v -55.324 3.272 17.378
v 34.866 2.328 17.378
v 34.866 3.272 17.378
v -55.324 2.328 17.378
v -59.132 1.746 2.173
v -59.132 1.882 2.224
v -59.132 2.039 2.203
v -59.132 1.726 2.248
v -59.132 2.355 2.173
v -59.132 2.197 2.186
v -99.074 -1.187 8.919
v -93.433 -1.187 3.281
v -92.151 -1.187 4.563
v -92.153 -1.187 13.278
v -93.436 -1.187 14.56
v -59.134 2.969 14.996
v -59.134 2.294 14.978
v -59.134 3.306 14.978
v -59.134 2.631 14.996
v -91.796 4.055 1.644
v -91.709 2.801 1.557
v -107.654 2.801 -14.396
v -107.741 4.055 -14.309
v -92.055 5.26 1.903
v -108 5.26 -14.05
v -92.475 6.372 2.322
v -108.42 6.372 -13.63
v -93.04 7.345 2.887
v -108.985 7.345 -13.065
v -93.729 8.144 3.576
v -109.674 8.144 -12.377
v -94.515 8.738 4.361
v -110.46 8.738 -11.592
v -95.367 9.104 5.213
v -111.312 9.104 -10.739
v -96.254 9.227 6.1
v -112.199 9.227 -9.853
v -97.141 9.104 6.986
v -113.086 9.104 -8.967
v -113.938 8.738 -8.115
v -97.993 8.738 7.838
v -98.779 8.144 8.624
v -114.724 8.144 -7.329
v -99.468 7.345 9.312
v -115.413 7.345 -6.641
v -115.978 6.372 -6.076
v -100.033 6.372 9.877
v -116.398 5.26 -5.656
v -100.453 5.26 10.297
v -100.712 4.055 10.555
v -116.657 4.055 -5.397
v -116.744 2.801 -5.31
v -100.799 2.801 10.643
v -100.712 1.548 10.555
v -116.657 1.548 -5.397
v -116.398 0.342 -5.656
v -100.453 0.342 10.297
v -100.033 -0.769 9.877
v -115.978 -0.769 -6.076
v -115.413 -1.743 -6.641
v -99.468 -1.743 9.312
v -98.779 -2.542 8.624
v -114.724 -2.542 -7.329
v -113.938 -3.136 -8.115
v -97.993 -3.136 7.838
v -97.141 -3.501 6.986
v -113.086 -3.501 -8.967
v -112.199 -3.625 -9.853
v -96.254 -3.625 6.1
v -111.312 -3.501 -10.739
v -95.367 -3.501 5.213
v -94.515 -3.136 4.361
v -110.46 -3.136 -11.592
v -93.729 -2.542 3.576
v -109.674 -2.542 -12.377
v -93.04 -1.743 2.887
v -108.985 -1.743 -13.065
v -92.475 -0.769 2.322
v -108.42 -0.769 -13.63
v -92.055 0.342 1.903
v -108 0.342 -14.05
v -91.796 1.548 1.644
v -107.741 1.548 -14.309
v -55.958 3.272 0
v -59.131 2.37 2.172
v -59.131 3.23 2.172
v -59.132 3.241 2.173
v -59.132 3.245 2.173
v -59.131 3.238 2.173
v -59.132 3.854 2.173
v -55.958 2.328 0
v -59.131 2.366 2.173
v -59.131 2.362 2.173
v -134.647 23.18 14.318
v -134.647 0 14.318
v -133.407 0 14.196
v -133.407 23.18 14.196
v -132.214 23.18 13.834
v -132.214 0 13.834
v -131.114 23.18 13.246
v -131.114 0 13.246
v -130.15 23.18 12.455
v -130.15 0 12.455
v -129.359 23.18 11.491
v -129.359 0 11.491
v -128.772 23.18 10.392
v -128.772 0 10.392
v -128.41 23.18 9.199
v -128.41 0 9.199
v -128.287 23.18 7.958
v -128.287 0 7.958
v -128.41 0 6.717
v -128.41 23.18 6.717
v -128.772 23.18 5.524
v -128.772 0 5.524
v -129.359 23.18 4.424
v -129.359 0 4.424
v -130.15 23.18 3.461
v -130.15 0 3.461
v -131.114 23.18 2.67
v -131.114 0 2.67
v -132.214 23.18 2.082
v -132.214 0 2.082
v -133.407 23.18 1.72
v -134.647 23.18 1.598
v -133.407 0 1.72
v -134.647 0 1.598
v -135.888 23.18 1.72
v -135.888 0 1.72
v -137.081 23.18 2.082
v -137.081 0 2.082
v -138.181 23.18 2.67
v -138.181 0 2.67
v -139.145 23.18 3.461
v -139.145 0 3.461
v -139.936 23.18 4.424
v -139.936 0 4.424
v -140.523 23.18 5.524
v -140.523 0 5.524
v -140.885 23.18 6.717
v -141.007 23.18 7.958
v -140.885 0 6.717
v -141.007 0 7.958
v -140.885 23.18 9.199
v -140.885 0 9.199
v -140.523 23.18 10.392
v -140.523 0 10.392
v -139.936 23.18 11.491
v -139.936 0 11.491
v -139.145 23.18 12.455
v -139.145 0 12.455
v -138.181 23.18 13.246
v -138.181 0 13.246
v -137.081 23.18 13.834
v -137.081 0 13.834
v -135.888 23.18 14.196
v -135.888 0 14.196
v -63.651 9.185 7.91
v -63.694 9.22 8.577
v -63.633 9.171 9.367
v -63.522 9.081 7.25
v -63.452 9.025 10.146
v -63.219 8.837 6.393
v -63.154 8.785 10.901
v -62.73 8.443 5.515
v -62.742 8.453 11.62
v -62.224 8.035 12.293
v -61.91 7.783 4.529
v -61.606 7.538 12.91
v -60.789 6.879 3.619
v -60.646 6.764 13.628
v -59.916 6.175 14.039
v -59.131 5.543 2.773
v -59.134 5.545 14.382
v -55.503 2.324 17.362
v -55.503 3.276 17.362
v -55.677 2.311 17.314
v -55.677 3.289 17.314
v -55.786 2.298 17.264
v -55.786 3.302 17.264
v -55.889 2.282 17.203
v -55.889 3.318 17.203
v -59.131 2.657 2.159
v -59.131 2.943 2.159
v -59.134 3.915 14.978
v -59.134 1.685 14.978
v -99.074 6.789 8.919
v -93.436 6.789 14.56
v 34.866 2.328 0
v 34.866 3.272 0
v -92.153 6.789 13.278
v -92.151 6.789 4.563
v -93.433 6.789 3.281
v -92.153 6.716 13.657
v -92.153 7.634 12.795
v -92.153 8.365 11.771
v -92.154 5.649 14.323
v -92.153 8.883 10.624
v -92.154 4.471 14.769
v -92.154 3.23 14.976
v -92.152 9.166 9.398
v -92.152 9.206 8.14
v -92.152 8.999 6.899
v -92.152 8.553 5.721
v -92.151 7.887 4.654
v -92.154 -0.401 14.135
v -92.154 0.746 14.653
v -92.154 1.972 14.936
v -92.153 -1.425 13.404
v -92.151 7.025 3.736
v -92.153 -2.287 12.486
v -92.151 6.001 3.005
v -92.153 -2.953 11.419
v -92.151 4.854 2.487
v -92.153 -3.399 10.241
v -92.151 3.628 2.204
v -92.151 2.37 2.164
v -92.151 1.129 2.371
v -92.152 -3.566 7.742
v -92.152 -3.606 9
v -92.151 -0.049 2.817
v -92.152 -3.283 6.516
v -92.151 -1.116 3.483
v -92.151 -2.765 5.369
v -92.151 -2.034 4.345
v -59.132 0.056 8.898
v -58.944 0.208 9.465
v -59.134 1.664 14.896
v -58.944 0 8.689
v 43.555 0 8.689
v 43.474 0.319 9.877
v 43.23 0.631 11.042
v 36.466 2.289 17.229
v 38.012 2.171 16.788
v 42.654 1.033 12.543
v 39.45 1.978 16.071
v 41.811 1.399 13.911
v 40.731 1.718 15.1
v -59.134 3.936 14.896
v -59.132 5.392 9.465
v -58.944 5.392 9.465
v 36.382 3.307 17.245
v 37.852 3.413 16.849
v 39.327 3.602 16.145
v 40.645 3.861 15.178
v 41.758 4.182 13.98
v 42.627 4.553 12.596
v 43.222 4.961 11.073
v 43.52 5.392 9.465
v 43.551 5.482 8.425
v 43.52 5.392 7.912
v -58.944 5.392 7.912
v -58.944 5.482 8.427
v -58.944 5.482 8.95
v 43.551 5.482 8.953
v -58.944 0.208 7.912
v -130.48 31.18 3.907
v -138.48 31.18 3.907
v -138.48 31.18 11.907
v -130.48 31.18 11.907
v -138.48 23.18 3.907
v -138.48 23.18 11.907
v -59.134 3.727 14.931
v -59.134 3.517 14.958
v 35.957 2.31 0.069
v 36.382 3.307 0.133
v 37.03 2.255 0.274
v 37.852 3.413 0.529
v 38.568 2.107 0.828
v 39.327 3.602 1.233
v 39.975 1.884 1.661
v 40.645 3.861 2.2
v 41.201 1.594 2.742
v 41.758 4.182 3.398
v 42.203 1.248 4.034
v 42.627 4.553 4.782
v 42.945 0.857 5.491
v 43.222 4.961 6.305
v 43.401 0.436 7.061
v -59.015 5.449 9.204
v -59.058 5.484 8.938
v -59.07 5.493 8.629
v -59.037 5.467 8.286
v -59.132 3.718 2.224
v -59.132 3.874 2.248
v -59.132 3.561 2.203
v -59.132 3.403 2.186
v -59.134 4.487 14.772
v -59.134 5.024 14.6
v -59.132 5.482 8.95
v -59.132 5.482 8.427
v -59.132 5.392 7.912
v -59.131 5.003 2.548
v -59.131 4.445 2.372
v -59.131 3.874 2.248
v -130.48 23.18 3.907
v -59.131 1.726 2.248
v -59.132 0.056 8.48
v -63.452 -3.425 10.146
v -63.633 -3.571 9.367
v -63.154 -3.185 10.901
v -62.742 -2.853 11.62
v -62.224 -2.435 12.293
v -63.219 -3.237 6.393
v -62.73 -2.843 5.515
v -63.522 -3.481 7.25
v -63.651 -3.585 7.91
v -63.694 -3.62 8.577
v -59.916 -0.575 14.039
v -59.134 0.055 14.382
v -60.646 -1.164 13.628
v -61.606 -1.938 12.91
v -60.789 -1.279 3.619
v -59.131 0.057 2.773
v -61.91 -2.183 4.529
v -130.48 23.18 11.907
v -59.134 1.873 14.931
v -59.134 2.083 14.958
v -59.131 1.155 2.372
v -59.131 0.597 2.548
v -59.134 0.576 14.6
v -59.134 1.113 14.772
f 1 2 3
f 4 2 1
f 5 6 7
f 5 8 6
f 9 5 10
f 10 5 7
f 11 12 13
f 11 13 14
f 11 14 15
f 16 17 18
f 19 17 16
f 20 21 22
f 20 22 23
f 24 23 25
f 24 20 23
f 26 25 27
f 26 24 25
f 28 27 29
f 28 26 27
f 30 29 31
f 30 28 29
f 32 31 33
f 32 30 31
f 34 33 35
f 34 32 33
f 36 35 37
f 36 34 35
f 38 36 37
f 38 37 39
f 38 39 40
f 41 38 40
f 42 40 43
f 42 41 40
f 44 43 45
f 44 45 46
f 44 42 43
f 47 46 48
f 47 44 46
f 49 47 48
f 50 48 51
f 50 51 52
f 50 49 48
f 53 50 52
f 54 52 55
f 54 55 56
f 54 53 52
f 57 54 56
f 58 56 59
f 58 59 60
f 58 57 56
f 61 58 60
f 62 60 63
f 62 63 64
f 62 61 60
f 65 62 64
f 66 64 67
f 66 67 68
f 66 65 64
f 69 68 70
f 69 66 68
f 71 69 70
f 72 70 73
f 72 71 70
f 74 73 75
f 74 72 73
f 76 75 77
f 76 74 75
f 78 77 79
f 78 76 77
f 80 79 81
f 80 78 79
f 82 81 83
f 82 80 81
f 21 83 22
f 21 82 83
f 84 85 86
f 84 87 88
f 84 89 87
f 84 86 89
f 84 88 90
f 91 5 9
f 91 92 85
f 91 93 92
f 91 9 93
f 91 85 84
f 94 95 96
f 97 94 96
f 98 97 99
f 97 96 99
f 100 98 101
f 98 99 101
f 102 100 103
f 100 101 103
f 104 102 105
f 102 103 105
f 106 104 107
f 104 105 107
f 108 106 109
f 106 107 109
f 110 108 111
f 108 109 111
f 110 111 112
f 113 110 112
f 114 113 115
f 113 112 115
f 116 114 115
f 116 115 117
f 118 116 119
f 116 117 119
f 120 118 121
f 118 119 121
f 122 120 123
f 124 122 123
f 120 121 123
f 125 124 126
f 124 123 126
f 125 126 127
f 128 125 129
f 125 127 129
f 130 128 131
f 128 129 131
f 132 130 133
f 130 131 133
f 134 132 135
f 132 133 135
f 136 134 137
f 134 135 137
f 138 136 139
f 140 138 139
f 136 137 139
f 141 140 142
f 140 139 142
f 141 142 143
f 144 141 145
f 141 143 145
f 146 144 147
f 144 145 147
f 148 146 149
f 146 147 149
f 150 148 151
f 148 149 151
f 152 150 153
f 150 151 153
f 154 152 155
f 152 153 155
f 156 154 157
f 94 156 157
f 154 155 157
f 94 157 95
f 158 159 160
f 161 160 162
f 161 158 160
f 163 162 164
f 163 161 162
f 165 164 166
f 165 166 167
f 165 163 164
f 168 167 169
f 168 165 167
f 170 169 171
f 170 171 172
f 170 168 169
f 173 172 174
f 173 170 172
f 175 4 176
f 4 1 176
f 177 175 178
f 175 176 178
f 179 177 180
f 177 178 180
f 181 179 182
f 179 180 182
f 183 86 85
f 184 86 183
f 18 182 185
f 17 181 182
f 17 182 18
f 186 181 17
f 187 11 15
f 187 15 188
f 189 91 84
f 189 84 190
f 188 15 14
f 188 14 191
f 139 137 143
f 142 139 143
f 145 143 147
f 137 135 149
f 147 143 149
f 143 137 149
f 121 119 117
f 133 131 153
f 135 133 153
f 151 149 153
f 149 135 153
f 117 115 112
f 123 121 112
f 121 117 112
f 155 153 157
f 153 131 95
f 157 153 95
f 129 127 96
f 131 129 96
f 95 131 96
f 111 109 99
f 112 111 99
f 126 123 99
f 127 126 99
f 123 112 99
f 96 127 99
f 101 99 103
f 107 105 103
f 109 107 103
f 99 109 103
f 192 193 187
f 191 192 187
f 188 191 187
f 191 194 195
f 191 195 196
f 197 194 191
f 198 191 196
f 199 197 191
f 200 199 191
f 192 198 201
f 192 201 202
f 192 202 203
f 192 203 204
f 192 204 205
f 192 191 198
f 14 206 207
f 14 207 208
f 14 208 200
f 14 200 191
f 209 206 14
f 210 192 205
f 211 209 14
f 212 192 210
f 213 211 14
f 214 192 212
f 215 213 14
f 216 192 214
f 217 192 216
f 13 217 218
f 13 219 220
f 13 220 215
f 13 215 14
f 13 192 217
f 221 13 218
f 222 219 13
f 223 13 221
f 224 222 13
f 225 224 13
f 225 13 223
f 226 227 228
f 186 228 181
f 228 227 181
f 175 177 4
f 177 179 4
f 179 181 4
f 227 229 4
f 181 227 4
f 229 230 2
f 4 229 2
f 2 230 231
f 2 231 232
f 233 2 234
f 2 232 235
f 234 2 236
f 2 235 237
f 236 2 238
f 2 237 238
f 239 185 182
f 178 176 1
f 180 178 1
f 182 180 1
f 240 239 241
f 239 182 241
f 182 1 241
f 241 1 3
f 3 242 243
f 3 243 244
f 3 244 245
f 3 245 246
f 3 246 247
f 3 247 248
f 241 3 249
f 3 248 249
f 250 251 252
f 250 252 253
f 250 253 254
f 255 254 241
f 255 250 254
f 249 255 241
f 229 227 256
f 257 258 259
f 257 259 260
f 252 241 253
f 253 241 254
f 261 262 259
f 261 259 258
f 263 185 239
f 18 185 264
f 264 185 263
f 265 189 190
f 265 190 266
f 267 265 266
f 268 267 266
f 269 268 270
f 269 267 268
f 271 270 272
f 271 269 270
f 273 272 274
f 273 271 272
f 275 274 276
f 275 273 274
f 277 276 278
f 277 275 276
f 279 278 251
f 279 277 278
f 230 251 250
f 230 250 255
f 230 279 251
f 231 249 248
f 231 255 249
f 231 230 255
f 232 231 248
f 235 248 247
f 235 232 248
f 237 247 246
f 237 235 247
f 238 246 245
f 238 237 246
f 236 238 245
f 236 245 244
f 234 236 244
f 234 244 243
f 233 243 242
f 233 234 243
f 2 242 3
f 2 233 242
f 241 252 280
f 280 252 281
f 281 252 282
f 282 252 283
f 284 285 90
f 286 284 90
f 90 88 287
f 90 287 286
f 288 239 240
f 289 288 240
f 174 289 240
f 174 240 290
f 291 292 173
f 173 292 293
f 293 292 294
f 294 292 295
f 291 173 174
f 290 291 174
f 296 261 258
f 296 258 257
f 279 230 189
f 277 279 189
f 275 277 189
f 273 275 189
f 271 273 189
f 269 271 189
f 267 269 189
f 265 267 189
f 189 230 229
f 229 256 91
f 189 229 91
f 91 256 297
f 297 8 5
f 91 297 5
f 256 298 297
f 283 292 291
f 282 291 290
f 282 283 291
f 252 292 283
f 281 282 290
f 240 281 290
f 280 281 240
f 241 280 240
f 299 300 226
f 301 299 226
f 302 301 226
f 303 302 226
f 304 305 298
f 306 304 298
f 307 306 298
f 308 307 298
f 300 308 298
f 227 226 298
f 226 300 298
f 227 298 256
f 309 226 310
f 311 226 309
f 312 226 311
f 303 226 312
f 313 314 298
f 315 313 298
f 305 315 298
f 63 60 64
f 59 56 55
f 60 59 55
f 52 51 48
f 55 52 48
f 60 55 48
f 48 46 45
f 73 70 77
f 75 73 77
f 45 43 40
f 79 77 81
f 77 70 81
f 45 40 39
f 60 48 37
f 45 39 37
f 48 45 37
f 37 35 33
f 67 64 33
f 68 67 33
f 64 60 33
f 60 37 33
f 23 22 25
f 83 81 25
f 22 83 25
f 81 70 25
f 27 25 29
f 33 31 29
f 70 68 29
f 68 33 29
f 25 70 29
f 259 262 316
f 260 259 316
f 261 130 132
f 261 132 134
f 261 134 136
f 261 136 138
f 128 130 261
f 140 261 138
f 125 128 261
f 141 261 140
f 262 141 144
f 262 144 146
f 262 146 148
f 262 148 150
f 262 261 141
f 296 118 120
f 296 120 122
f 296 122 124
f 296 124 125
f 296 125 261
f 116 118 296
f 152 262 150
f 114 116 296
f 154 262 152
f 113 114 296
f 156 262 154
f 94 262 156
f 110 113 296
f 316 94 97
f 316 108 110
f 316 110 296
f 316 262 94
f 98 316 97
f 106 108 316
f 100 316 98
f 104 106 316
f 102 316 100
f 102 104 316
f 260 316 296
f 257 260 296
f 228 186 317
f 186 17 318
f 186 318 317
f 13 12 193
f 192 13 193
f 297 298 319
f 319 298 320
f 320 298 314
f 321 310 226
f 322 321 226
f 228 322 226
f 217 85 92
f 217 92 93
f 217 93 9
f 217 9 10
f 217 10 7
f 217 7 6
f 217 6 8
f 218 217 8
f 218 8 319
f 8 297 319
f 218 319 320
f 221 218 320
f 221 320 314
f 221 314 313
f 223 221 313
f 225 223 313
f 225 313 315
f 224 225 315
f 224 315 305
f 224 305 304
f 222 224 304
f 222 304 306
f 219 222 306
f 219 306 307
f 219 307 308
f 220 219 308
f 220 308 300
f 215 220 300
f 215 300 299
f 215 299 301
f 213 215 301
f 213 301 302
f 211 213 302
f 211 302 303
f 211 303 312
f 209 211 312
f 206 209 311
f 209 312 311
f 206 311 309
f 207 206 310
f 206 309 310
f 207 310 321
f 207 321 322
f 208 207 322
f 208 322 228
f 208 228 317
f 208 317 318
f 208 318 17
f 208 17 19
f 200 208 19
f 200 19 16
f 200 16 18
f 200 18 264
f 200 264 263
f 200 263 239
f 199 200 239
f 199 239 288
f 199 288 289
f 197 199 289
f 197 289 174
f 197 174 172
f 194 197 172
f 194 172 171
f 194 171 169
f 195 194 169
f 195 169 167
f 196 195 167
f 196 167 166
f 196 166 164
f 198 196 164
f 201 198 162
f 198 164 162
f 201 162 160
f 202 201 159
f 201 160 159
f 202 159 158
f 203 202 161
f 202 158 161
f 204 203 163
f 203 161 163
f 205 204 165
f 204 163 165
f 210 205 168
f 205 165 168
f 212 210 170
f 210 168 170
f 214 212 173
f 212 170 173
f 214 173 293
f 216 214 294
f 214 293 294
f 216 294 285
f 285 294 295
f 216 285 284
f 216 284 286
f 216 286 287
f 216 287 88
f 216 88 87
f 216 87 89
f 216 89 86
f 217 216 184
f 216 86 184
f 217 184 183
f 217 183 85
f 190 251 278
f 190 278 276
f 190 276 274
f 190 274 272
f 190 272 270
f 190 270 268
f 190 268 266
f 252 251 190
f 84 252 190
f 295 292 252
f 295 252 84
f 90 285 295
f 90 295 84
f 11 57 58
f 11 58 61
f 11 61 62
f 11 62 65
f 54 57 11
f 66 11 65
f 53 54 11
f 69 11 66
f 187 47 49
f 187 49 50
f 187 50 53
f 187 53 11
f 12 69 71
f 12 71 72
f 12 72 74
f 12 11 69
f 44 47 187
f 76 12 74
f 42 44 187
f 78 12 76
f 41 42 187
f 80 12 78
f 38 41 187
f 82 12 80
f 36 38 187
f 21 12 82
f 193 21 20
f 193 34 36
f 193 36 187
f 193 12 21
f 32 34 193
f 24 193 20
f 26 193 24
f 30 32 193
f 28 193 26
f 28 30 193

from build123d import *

# Parameters (mm, degrees)
BOSS_EXTRUDE2_DEPTH = 5.6
CHAMFER2_SIZE       = 2.328478482
CHAMFER2_SIZE_2     = 8.69
CHAMFER3_SIZE       = 8.69
CHAMFER3_SIZE_2     = 2.328478482
CHAMFER4_SIZE       = 8.69
CHAMFER4_SIZE_2     = 2.328478482
CHAMFER5_SIZE       = 8.69
CHAMFER5_SIZE_2     = 2.328478482
FILLET1_R           = 1
SKETCH8_R           = 6.42
BOSS_EXTRUDE3_DEPTH = 33.02
FILLET2_R           = 3
CUT_EXTRUDE12_DEPTH = 16
SKETCH21_R          = 6.36
BOSS_EXTRUDE4_DEPTH = 23.18
SKETCH22_W          = 8
SKETCH22_H          = 8
BOSS_EXTRUDE5_DEPTH = 8
SKETCH26_R          = 6.4262
BOSS_EXTRUDE6_DEPTH = 22.5552
SKETCH27_W          = 7.9756
SKETCH27_H          = 7.9756
BOSS_EXTRUDE7_DEPTH = 7.9756


with BuildPart() as part:
    # Sketch3 → Boss-Extrude2 (new body)
    with BuildSketch(Plane(origin=(0, 0, 0), x_dir=(1, 0, 0), z_dir=(0, 1, 0))):
        with BuildLine():
            Line((-55.958218902, 0), (34.866239796, 0))
            ThreePointArc((34.866239796, 0), (43.555159042, -8.688919246), (34.866239796, -17.377838493))
            Line((34.866239796, -17.377838493), (-55.633760204, -17.377838493))
            Line((-55.633760204, -17.377838493), (-59.133760204, -14.977838493))
            Line((-59.133760204, -14.977838493), (-59.132241437, -8.577838493))
            Line((-59.132241437, -8.577838493), (-59.132241437, -2.173298587))
            Line((-59.132241437, -2.173298587), (-55.958218902, 0))
        make_face()
    extrude(amount=BOSS_EXTRUDE2_DEPTH)

    # Chamfer2
    # the kernel refuses this chamfer: 8.69, 2.328478482 mm, written as the material it takes off along each edge
    with BuildSketch(Plane(origin=(57.431750241, 5.6, 17.377838493), x_dir=(0, -0.9905000388259545, 0.13751244702128881), z_dir=(-1, 0, 0))) as chamfer2_piece_1:
        Polygon((CHAMFER2_SIZE * 0.990500038922, -CHAMFER2_SIZE * 0.137512447035), (-CHAMFER2_SIZE_2 * 0.137512447021, -CHAMFER2_SIZE_2 * 0.990500038826), (0, 0), align=None)
    extrude(amount=135.63102089, mode=Mode.SUBTRACT)

    # Chamfer3
    # the kernel refuses this chamfer: 8.69, 2.328478482 mm, written as the material it takes off along each edge
    with BuildSketch(Plane(origin=(57.431750241, 0, 17.377838493), x_dir=(0, -0.009967146577156423, -0.9999503267608394), z_dir=(-1, 0, 0))) as chamfer3_piece_1:
        Polygon((CHAMFER3_SIZE * 0.999950326761, -CHAMFER3_SIZE * 0.00996714657716), (-CHAMFER3_SIZE_2 * 0.00996714657813, -CHAMFER3_SIZE_2 * 0.999950326858), (0, 0), align=None)
    extrude(amount=135.63102089, mode=Mode.SUBTRACT)

    # Chamfer4
    # the kernel refuses this chamfer: 8.69, 2.328478482 mm, written as the material it takes off along each edge
    with BuildSketch(Plane(origin=(-78.523729347, 5.6, 0), x_dir=(0, 0.00996714657715643, 0.9999503267608394), z_dir=(1, 0, 0))) as chamfer4_piece_1:
        Polygon((CHAMFER4_SIZE * 0.999950326761, CHAMFER4_SIZE * 0.00996714657716), (-CHAMFER4_SIZE_2 * 0.00996714657813, CHAMFER4_SIZE_2 * 0.999950326858), (0, 0), align=None)
    extrude(amount=135.955479588, mode=Mode.SUBTRACT)

    # Chamfer5
    # the kernel refuses this chamfer: 8.69, 2.328478482 mm, written as the material it takes off along each edge
    with BuildSketch(Plane(origin=(-78.523729347, 0, 0), x_dir=(0, -0.009967146577156423, 0.9999503267608394), z_dir=(1, 0, 0))) as chamfer5_piece_1:
        Polygon((CHAMFER5_SIZE * 0.999950326761, -CHAMFER5_SIZE * 0.00996714657716), (-CHAMFER5_SIZE_2 * 0.00996714657813, -CHAMFER5_SIZE_2 * 0.999950326858), (0, 0), align=None)
    extrude(amount=135.955479588, mode=Mode.SUBTRACT)

    # Fillet1
    fillet1_edges = [part.edges().sort_by_distance(p)[0] for p in [
        (-55.633760204, 2.8, 17.377838493),
    ]]
    fillet(fillet1_edges, radius=FILLET1_R)

    # Sketch8 → Boss-Extrude3 (add)
    with BuildSketch(Plane(origin=(-59.130202523, 0, -0.014032034), x_dir=(-0.00023730738394525297, 0, 0.9999999718426024), z_dir=(-0.9999999718426024, 0, -0.00023730738394525297))):
        with Locations(Location((8.591870769, 2.8, 0), (0, 0, 183.840787638))):
            Circle(SKETCH8_R)
    extrude(amount=BOSS_EXTRUDE3_DEPTH)

    # Fillet2
    fillet2_edges = [part.edges().sort_by_distance(p)[0] for p in [
        (-7.788554378, 5.599710413, 8.688919246),
    ]]
    fillet(fillet2_edges, radius=FILLET2_R)

    # Sketch16 → Cut-Extrude12 (cut)
    with BuildSketch(Plane.XY):
        Polygon((-58.943650552, 9.22), (-63.693726721, 9.22), (-58.943650552, 5.391659351), align=None)
        Polygon((-58.943650552, -3.62), (-63.693726721, -3.62), (-58.943650552, 0.208340649), align=None)
    extrude(amount=CUT_EXTRUDE12_DEPTH, mode=Mode.SUBTRACT)



with BuildPart() as body_2:
    # Sketch21 → Boss-Extrude4 (new body)
    with BuildSketch(Plane(origin=(0, 0, 0), x_dir=(1, 0, 0), z_dir=(0, 1, 0))):
        with Locations(Location((-134.647466818, -7.957912817, 0), (0, 0, 270))):
            Circle(SKETCH21_R)
    extrude(amount=BOSS_EXTRUDE4_DEPTH)

    # Sketch22 → Boss-Extrude5 (add)
    with BuildSketch(Plane(origin=(0, 23.18, 0), x_dir=(1, 0, 0), z_dir=(0, 1, 0))):
        with Locations((-134.479881672, -7.906897789)):
            Rectangle(SKETCH22_W, SKETCH22_H)
    extrude(amount=BOSS_EXTRUDE5_DEPTH)


with BuildPart() as body_3:
    # Sketch26 → Boss-Extrude6 (new body)
    with BuildSketch(Plane(origin=(-45.05425196, 0, -45.075640449), x_dir=(0, 1, 0), z_dir=(0.7069389596158512, 0, 0.7072745629366703))):
        with Locations(Location((2.801295813, 72.39, 0), (0, 0, 270))):
            Circle(SKETCH26_R)
    extrude(amount=-BOSS_EXTRUDE6_DEPTH)


with BuildPart() as part_1:
    add(part.part)

    add(body_3.part)  # Boss-Extrude7 merges body 3
    # Sketch27 → Boss-Extrude7 (add)
    with BuildSketch(Plane(origin=(-45.05425196, 0, -45.075640449), x_dir=(0, 1, 0), z_dir=(0.7069389596158512, 0, 0.7072745629366703))):
        with Locations((2.801295813, 72.39)):
            Rectangle(SKETCH27_W, SKETCH27_H)
    extrude(amount=BOSS_EXTRUDE7_DEPTH)


solid = Compound([body_2.part, part_1.part])
